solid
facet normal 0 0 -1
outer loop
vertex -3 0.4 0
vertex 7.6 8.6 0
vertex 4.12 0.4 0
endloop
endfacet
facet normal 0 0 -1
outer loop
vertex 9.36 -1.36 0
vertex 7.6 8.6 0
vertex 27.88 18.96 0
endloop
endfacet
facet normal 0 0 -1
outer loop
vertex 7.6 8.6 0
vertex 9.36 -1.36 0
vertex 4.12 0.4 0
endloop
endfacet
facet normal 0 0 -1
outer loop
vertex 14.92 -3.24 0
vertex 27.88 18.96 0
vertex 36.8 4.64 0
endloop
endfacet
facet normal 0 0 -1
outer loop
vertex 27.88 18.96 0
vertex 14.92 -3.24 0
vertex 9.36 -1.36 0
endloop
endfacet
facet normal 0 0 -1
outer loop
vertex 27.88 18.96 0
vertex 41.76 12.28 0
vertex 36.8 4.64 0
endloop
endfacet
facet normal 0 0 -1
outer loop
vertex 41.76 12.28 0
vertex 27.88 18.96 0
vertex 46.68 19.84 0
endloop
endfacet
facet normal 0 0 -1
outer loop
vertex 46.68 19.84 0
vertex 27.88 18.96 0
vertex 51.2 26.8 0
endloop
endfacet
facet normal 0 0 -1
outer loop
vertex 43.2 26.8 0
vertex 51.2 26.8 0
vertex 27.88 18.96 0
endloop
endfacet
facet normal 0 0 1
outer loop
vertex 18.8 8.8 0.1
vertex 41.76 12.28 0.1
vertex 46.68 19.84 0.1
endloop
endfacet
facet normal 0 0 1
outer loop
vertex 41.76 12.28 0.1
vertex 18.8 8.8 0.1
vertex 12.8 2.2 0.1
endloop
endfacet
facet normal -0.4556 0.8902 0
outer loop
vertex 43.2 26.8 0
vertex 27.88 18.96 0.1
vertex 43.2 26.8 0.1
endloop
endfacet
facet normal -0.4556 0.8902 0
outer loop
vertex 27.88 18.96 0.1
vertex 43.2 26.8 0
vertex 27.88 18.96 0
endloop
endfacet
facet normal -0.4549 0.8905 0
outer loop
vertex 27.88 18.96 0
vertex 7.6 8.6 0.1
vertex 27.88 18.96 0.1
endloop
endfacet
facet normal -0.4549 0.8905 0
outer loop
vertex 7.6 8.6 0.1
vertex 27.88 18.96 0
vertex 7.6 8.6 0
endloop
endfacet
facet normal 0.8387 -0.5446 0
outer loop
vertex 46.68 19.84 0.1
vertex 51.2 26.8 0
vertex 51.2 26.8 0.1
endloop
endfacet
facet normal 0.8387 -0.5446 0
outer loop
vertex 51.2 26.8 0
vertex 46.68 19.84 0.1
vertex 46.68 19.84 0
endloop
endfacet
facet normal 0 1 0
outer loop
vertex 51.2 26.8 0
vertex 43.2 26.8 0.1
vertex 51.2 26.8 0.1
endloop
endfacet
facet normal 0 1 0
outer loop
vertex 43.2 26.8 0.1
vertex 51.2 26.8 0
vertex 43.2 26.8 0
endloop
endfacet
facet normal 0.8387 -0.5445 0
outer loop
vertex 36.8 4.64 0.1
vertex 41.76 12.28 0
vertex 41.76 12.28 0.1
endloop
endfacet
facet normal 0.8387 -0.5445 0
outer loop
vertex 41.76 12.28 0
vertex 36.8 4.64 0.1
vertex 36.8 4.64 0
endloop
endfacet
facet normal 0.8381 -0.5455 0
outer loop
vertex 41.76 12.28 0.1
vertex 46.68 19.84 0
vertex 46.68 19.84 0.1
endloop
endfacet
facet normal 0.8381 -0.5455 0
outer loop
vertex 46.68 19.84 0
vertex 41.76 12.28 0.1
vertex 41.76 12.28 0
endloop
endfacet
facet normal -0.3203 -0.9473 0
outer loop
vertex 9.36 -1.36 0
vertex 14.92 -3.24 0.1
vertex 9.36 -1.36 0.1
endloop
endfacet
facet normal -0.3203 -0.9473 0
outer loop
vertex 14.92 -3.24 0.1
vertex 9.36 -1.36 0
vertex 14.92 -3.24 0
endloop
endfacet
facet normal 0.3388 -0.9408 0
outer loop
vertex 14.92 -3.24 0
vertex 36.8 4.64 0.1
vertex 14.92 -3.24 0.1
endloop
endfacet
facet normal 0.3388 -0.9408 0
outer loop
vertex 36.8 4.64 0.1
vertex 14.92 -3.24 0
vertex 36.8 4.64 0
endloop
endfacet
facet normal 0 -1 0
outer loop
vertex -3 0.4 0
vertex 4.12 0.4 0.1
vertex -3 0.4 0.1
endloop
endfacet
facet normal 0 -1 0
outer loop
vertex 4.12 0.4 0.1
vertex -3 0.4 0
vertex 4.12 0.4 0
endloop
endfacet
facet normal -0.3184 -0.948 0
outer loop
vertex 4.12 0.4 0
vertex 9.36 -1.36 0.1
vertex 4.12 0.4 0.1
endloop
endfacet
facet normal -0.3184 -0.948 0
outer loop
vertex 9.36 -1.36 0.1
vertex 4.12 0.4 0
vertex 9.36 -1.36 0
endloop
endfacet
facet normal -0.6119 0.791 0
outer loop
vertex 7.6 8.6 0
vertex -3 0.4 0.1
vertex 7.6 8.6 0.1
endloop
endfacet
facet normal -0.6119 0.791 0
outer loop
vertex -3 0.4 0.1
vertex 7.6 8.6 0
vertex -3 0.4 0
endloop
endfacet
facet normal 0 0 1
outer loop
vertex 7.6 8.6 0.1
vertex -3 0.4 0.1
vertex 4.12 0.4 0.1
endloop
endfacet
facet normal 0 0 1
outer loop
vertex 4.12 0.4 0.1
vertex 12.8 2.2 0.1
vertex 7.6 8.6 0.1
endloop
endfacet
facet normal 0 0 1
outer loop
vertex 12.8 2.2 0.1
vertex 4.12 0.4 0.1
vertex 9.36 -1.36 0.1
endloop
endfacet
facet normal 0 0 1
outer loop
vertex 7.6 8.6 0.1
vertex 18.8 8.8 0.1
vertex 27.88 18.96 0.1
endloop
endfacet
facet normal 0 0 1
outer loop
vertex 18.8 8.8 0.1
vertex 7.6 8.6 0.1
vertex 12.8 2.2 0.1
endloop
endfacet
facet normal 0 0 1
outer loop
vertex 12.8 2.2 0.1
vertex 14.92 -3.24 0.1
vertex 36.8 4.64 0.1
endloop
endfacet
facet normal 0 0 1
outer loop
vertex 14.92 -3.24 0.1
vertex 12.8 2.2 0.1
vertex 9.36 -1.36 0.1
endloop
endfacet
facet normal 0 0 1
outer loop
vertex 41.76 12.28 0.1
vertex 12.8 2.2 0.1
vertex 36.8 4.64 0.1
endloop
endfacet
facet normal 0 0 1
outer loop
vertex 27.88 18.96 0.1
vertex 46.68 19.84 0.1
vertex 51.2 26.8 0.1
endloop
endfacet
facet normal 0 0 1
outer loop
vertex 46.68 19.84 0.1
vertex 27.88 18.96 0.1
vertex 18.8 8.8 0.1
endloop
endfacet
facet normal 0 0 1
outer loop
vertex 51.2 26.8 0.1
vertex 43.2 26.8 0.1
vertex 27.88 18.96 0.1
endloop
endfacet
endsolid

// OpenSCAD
use <../lib.scad>
function ldraw_lib__164325d() = [
// 0 Sticker  3.8 x  6.8 Tail Plane with Emirates Airlines Logo Left
// 0 Name: 164325d.dat
// 0 Author: Takeshi Takahashi [RainbowDolphin]
// 0 !LDRAW_ORG Part UPDATE 2025-07
// 0 !LICENSE Licensed under CC BY 4.0 : see CAreadme.txt
// 
// 0 BFC CERTIFY CCW
  [0,"BFC","CERTIFY"],
  [0,"BFC","CCW"],
// 
// 0 !KEYWORDS Airliner, Bricklink 1973stk01, Brickowl 949698, Plane
// 0 !KEYWORDS Rebrickable 164325, Set 1973
// 
// 0 !HISTORY 2023-12-31 [OrionP] Official Update 2023-07
// 0 !HISTORY 2025-07-27 [OrionP] Minor header edits
// 0 !HISTORY 2025-07-27 [OrionP] Official Update 2025-07
// 
// 
// 3 16 -7.5 0 1 19 0 21.5 10.3 0 1
  [3,16,-7.5,0,1,19,0,21.5,10.3,0,1],
// 4 16 23.4 0 -3.4 10.3 0 1 19 0 21.5 69.7 0 47.4
  [4,16,23.4,0,-3.4,10.3,0,1,19,0,21.5,69.7,0,47.4],
// 4 16 37.3 0 -8.1 23.4 0 -3.4 69.7 0 47.4 92 0 11.6
  [4,16,37.3,0,-8.1,23.4,0,-3.4,69.7,0,47.4,92,0,11.6],
// 3 16 69.7 0 47.4 104.4 0 30.7 92 0 11.6
  [3,16,69.7,0,47.4,104.4,0,30.7,92,0,11.6],
// 3 16 104.4 0 30.7 69.7 0 47.4 116.7 0 49.6
  [3,16,104.4,0,30.7,69.7,0,47.4,116.7,0,49.6],
// 3 16 116.7 0 49.6 69.7 0 47.4 128 0 67
  [3,16,116.7,0,49.6,69.7,0,47.4,128,0,67],
// 3 16 108 0 67 128 0 67 69.7 0 47.4
  [3,16,108,0,67,128,0,67,69.7,0,47.4],
// 4 16 47 -.25 22 32 -.25 5.5 104.4 -.25 30.7 116.7 -.25 49.6
  [4,16,47,-.25,22,32,-.25,5.5,104.4,-.25,30.7,116.7,-.25,49.6],
// 4 16 108 -.25 67 108 0 67 69.7 0 47.4 69.7 -.25 47.4
  [4,16,108,-.25,67,108,0,67,69.7,0,47.4,69.7,-.25,47.4],
// 4 16 69.7 -.25 47.4 69.7 0 47.4 19 0 21.5 19 -.25 21.5
  [4,16,69.7,-.25,47.4,69.7,0,47.4,19,0,21.5,19,-.25,21.5],
// 4 16 116.7 -.25 49.6 116.7 0 49.6 128 0 67 128 -.25 67
  [4,16,116.7,-.25,49.6,116.7,0,49.6,128,0,67,128,-.25,67],
// 4 16 128 -.25 67 128 0 67 108 0 67 108 -.25 67
  [4,16,128,-.25,67,128,0,67,108,0,67,108,-.25,67],
// 4 16 92 -.25 11.6 92 0 11.6 104.4 0 30.7 104.4 -.25 30.7
  [4,16,92,-.25,11.6,92,0,11.6,104.4,0,30.7,104.4,-.25,30.7],
// 4 16 104.4 -.25 30.7 104.4 0 30.7 116.7 0 49.6 116.7 -.25 49.6
  [4,16,104.4,-.25,30.7,104.4,0,30.7,116.7,0,49.6,116.7,-.25,49.6],
// 4 16 23.4 -.25 -3.4 23.4 0 -3.4 37.3 0 -8.1 37.3 -.25 -8.1
  [4,16,23.4,-.25,-3.4,23.4,0,-3.4,37.3,0,-8.1,37.3,-.25,-8.1],
// 4 16 37.3 -.25 -8.1 37.3 0 -8.1 92 0 11.6 92 -.25 11.6
  [4,16,37.3,-.25,-8.1,37.3,0,-8.1,92,0,11.6,92,-.25,11.6],
// 4 16 -7.5 -.25 1 -7.5 0 1 10.3 0 1 10.3 -.25 1
  [4,16,-7.5,-.25,1,-7.5,0,1,10.3,0,1,10.3,-.25,1],
// 4 16 10.3 -.25 1 10.3 0 1 23.4 0 -3.4 23.4 -.25 -3.4
  [4,16,10.3,-.25,1,10.3,0,1,23.4,0,-3.4,23.4,-.25,-3.4],
// 4 16 19 -.25 21.5 19 0 21.5 -7.5 0 1 -7.5 -.25 1
  [4,16,19,-.25,21.5,19,0,21.5,-7.5,0,1,-7.5,-.25,1],
// 0 BFC NOCLIP
  [0,"BFC","NOCLIP"],
// 3 4 19 -.25 21.5 -7.5 -.25 1 10.3 -.25 1
  [3,4,19,-.25,21.5,-7.5,-.25,1,10.3,-.25,1],
// 4 4 19 -.25 21.5 10.3 -.25 1 23.4 -.25 -3.4 32 -.25 5.5
  [4,4,19,-.25,21.5,10.3,-.25,1,23.4,-.25,-3.4,32,-.25,5.5],
// 4 4 19 -.25 21.5 32 -.25 5.5 47 -.25 22 69.7 -.25 47.4
  [4,4,19,-.25,21.5,32,-.25,5.5,47,-.25,22,69.7,-.25,47.4],
// 4 0 32 -.25 5.5 23.4 -.25 -3.4 37.3 -.25 -8.1 92 -.25 11.6
  [4,0,32,-.25,5.5,23.4,-.25,-3.4,37.3,-.25,-8.1,92,-.25,11.6],
// 3 0 104.4 -.25 30.7 32 -.25 5.5 92 -.25 11.6
  [3,0,104.4,-.25,30.7,32,-.25,5.5,92,-.25,11.6],
// 4 2 69.7 -.25 47.4 47 -.25 22 116.7 -.25 49.6 128 -.25 67
  [4,2,69.7,-.25,47.4,47,-.25,22,116.7,-.25,49.6,128,-.25,67],
// 3 2 128 -.25 67 108 -.25 67 69.7 -.25 47.4
  [3,2,128,-.25,67,108,-.25,67,69.7,-.25,47.4],
// 0 BFC CLIP
  [0,"BFC","CLIP"],
// 5 24 37.3 0 -8.1 37.3 -.25 -8.1 23.4 0 -3.4 92 0 11.6
  [5,24,37.3,0,-8.1,37.3,-.25,-8.1,23.4,0,-3.4,92,0,11.6],
// 5 24 92 0 11.6 92 -.25 11.6 37.3 0 -8.1 104.4 0 30.7
  [5,24,92,0,11.6,92,-.25,11.6,37.3,0,-8.1,104.4,0,30.7],
// 5 24 10.3 0 1 10.3 -.25 1 -7.5 0 1 23.4 0 -3.4
  [5,24,10.3,0,1,10.3,-.25,1,-7.5,0,1,23.4,0,-3.4],
// 5 24 23.4 0 -3.4 23.4 -.25 -3.4 10.3 0 1 37.3 0 -8.1
  [5,24,23.4,0,-3.4,23.4,-.25,-3.4,10.3,0,1,37.3,0,-8.1],
// 5 24 19 0 21.5 19 -.25 21.5 -7.5 0 1 69.7 0 47.4
  [5,24,19,0,21.5,19,-.25,21.5,-7.5,0,1,69.7,0,47.4],
// 5 24 108 0 67 108 -.25 67 128 0 67 69.7 0 47.4
  [5,24,108,0,67,108,-.25,67,128,0,67,69.7,0,47.4],
];
module ldraw_lib__164325d(step=0, col=false, unit=2/5, alt=false, line=0.2, solid=!$preview)
    makepoly(ldraw_lib__164325d(), step=step, col=col, unit=unit, alt=alt, line=line, solid=solid);
ldraw_lib__164325d(line=0.2);
